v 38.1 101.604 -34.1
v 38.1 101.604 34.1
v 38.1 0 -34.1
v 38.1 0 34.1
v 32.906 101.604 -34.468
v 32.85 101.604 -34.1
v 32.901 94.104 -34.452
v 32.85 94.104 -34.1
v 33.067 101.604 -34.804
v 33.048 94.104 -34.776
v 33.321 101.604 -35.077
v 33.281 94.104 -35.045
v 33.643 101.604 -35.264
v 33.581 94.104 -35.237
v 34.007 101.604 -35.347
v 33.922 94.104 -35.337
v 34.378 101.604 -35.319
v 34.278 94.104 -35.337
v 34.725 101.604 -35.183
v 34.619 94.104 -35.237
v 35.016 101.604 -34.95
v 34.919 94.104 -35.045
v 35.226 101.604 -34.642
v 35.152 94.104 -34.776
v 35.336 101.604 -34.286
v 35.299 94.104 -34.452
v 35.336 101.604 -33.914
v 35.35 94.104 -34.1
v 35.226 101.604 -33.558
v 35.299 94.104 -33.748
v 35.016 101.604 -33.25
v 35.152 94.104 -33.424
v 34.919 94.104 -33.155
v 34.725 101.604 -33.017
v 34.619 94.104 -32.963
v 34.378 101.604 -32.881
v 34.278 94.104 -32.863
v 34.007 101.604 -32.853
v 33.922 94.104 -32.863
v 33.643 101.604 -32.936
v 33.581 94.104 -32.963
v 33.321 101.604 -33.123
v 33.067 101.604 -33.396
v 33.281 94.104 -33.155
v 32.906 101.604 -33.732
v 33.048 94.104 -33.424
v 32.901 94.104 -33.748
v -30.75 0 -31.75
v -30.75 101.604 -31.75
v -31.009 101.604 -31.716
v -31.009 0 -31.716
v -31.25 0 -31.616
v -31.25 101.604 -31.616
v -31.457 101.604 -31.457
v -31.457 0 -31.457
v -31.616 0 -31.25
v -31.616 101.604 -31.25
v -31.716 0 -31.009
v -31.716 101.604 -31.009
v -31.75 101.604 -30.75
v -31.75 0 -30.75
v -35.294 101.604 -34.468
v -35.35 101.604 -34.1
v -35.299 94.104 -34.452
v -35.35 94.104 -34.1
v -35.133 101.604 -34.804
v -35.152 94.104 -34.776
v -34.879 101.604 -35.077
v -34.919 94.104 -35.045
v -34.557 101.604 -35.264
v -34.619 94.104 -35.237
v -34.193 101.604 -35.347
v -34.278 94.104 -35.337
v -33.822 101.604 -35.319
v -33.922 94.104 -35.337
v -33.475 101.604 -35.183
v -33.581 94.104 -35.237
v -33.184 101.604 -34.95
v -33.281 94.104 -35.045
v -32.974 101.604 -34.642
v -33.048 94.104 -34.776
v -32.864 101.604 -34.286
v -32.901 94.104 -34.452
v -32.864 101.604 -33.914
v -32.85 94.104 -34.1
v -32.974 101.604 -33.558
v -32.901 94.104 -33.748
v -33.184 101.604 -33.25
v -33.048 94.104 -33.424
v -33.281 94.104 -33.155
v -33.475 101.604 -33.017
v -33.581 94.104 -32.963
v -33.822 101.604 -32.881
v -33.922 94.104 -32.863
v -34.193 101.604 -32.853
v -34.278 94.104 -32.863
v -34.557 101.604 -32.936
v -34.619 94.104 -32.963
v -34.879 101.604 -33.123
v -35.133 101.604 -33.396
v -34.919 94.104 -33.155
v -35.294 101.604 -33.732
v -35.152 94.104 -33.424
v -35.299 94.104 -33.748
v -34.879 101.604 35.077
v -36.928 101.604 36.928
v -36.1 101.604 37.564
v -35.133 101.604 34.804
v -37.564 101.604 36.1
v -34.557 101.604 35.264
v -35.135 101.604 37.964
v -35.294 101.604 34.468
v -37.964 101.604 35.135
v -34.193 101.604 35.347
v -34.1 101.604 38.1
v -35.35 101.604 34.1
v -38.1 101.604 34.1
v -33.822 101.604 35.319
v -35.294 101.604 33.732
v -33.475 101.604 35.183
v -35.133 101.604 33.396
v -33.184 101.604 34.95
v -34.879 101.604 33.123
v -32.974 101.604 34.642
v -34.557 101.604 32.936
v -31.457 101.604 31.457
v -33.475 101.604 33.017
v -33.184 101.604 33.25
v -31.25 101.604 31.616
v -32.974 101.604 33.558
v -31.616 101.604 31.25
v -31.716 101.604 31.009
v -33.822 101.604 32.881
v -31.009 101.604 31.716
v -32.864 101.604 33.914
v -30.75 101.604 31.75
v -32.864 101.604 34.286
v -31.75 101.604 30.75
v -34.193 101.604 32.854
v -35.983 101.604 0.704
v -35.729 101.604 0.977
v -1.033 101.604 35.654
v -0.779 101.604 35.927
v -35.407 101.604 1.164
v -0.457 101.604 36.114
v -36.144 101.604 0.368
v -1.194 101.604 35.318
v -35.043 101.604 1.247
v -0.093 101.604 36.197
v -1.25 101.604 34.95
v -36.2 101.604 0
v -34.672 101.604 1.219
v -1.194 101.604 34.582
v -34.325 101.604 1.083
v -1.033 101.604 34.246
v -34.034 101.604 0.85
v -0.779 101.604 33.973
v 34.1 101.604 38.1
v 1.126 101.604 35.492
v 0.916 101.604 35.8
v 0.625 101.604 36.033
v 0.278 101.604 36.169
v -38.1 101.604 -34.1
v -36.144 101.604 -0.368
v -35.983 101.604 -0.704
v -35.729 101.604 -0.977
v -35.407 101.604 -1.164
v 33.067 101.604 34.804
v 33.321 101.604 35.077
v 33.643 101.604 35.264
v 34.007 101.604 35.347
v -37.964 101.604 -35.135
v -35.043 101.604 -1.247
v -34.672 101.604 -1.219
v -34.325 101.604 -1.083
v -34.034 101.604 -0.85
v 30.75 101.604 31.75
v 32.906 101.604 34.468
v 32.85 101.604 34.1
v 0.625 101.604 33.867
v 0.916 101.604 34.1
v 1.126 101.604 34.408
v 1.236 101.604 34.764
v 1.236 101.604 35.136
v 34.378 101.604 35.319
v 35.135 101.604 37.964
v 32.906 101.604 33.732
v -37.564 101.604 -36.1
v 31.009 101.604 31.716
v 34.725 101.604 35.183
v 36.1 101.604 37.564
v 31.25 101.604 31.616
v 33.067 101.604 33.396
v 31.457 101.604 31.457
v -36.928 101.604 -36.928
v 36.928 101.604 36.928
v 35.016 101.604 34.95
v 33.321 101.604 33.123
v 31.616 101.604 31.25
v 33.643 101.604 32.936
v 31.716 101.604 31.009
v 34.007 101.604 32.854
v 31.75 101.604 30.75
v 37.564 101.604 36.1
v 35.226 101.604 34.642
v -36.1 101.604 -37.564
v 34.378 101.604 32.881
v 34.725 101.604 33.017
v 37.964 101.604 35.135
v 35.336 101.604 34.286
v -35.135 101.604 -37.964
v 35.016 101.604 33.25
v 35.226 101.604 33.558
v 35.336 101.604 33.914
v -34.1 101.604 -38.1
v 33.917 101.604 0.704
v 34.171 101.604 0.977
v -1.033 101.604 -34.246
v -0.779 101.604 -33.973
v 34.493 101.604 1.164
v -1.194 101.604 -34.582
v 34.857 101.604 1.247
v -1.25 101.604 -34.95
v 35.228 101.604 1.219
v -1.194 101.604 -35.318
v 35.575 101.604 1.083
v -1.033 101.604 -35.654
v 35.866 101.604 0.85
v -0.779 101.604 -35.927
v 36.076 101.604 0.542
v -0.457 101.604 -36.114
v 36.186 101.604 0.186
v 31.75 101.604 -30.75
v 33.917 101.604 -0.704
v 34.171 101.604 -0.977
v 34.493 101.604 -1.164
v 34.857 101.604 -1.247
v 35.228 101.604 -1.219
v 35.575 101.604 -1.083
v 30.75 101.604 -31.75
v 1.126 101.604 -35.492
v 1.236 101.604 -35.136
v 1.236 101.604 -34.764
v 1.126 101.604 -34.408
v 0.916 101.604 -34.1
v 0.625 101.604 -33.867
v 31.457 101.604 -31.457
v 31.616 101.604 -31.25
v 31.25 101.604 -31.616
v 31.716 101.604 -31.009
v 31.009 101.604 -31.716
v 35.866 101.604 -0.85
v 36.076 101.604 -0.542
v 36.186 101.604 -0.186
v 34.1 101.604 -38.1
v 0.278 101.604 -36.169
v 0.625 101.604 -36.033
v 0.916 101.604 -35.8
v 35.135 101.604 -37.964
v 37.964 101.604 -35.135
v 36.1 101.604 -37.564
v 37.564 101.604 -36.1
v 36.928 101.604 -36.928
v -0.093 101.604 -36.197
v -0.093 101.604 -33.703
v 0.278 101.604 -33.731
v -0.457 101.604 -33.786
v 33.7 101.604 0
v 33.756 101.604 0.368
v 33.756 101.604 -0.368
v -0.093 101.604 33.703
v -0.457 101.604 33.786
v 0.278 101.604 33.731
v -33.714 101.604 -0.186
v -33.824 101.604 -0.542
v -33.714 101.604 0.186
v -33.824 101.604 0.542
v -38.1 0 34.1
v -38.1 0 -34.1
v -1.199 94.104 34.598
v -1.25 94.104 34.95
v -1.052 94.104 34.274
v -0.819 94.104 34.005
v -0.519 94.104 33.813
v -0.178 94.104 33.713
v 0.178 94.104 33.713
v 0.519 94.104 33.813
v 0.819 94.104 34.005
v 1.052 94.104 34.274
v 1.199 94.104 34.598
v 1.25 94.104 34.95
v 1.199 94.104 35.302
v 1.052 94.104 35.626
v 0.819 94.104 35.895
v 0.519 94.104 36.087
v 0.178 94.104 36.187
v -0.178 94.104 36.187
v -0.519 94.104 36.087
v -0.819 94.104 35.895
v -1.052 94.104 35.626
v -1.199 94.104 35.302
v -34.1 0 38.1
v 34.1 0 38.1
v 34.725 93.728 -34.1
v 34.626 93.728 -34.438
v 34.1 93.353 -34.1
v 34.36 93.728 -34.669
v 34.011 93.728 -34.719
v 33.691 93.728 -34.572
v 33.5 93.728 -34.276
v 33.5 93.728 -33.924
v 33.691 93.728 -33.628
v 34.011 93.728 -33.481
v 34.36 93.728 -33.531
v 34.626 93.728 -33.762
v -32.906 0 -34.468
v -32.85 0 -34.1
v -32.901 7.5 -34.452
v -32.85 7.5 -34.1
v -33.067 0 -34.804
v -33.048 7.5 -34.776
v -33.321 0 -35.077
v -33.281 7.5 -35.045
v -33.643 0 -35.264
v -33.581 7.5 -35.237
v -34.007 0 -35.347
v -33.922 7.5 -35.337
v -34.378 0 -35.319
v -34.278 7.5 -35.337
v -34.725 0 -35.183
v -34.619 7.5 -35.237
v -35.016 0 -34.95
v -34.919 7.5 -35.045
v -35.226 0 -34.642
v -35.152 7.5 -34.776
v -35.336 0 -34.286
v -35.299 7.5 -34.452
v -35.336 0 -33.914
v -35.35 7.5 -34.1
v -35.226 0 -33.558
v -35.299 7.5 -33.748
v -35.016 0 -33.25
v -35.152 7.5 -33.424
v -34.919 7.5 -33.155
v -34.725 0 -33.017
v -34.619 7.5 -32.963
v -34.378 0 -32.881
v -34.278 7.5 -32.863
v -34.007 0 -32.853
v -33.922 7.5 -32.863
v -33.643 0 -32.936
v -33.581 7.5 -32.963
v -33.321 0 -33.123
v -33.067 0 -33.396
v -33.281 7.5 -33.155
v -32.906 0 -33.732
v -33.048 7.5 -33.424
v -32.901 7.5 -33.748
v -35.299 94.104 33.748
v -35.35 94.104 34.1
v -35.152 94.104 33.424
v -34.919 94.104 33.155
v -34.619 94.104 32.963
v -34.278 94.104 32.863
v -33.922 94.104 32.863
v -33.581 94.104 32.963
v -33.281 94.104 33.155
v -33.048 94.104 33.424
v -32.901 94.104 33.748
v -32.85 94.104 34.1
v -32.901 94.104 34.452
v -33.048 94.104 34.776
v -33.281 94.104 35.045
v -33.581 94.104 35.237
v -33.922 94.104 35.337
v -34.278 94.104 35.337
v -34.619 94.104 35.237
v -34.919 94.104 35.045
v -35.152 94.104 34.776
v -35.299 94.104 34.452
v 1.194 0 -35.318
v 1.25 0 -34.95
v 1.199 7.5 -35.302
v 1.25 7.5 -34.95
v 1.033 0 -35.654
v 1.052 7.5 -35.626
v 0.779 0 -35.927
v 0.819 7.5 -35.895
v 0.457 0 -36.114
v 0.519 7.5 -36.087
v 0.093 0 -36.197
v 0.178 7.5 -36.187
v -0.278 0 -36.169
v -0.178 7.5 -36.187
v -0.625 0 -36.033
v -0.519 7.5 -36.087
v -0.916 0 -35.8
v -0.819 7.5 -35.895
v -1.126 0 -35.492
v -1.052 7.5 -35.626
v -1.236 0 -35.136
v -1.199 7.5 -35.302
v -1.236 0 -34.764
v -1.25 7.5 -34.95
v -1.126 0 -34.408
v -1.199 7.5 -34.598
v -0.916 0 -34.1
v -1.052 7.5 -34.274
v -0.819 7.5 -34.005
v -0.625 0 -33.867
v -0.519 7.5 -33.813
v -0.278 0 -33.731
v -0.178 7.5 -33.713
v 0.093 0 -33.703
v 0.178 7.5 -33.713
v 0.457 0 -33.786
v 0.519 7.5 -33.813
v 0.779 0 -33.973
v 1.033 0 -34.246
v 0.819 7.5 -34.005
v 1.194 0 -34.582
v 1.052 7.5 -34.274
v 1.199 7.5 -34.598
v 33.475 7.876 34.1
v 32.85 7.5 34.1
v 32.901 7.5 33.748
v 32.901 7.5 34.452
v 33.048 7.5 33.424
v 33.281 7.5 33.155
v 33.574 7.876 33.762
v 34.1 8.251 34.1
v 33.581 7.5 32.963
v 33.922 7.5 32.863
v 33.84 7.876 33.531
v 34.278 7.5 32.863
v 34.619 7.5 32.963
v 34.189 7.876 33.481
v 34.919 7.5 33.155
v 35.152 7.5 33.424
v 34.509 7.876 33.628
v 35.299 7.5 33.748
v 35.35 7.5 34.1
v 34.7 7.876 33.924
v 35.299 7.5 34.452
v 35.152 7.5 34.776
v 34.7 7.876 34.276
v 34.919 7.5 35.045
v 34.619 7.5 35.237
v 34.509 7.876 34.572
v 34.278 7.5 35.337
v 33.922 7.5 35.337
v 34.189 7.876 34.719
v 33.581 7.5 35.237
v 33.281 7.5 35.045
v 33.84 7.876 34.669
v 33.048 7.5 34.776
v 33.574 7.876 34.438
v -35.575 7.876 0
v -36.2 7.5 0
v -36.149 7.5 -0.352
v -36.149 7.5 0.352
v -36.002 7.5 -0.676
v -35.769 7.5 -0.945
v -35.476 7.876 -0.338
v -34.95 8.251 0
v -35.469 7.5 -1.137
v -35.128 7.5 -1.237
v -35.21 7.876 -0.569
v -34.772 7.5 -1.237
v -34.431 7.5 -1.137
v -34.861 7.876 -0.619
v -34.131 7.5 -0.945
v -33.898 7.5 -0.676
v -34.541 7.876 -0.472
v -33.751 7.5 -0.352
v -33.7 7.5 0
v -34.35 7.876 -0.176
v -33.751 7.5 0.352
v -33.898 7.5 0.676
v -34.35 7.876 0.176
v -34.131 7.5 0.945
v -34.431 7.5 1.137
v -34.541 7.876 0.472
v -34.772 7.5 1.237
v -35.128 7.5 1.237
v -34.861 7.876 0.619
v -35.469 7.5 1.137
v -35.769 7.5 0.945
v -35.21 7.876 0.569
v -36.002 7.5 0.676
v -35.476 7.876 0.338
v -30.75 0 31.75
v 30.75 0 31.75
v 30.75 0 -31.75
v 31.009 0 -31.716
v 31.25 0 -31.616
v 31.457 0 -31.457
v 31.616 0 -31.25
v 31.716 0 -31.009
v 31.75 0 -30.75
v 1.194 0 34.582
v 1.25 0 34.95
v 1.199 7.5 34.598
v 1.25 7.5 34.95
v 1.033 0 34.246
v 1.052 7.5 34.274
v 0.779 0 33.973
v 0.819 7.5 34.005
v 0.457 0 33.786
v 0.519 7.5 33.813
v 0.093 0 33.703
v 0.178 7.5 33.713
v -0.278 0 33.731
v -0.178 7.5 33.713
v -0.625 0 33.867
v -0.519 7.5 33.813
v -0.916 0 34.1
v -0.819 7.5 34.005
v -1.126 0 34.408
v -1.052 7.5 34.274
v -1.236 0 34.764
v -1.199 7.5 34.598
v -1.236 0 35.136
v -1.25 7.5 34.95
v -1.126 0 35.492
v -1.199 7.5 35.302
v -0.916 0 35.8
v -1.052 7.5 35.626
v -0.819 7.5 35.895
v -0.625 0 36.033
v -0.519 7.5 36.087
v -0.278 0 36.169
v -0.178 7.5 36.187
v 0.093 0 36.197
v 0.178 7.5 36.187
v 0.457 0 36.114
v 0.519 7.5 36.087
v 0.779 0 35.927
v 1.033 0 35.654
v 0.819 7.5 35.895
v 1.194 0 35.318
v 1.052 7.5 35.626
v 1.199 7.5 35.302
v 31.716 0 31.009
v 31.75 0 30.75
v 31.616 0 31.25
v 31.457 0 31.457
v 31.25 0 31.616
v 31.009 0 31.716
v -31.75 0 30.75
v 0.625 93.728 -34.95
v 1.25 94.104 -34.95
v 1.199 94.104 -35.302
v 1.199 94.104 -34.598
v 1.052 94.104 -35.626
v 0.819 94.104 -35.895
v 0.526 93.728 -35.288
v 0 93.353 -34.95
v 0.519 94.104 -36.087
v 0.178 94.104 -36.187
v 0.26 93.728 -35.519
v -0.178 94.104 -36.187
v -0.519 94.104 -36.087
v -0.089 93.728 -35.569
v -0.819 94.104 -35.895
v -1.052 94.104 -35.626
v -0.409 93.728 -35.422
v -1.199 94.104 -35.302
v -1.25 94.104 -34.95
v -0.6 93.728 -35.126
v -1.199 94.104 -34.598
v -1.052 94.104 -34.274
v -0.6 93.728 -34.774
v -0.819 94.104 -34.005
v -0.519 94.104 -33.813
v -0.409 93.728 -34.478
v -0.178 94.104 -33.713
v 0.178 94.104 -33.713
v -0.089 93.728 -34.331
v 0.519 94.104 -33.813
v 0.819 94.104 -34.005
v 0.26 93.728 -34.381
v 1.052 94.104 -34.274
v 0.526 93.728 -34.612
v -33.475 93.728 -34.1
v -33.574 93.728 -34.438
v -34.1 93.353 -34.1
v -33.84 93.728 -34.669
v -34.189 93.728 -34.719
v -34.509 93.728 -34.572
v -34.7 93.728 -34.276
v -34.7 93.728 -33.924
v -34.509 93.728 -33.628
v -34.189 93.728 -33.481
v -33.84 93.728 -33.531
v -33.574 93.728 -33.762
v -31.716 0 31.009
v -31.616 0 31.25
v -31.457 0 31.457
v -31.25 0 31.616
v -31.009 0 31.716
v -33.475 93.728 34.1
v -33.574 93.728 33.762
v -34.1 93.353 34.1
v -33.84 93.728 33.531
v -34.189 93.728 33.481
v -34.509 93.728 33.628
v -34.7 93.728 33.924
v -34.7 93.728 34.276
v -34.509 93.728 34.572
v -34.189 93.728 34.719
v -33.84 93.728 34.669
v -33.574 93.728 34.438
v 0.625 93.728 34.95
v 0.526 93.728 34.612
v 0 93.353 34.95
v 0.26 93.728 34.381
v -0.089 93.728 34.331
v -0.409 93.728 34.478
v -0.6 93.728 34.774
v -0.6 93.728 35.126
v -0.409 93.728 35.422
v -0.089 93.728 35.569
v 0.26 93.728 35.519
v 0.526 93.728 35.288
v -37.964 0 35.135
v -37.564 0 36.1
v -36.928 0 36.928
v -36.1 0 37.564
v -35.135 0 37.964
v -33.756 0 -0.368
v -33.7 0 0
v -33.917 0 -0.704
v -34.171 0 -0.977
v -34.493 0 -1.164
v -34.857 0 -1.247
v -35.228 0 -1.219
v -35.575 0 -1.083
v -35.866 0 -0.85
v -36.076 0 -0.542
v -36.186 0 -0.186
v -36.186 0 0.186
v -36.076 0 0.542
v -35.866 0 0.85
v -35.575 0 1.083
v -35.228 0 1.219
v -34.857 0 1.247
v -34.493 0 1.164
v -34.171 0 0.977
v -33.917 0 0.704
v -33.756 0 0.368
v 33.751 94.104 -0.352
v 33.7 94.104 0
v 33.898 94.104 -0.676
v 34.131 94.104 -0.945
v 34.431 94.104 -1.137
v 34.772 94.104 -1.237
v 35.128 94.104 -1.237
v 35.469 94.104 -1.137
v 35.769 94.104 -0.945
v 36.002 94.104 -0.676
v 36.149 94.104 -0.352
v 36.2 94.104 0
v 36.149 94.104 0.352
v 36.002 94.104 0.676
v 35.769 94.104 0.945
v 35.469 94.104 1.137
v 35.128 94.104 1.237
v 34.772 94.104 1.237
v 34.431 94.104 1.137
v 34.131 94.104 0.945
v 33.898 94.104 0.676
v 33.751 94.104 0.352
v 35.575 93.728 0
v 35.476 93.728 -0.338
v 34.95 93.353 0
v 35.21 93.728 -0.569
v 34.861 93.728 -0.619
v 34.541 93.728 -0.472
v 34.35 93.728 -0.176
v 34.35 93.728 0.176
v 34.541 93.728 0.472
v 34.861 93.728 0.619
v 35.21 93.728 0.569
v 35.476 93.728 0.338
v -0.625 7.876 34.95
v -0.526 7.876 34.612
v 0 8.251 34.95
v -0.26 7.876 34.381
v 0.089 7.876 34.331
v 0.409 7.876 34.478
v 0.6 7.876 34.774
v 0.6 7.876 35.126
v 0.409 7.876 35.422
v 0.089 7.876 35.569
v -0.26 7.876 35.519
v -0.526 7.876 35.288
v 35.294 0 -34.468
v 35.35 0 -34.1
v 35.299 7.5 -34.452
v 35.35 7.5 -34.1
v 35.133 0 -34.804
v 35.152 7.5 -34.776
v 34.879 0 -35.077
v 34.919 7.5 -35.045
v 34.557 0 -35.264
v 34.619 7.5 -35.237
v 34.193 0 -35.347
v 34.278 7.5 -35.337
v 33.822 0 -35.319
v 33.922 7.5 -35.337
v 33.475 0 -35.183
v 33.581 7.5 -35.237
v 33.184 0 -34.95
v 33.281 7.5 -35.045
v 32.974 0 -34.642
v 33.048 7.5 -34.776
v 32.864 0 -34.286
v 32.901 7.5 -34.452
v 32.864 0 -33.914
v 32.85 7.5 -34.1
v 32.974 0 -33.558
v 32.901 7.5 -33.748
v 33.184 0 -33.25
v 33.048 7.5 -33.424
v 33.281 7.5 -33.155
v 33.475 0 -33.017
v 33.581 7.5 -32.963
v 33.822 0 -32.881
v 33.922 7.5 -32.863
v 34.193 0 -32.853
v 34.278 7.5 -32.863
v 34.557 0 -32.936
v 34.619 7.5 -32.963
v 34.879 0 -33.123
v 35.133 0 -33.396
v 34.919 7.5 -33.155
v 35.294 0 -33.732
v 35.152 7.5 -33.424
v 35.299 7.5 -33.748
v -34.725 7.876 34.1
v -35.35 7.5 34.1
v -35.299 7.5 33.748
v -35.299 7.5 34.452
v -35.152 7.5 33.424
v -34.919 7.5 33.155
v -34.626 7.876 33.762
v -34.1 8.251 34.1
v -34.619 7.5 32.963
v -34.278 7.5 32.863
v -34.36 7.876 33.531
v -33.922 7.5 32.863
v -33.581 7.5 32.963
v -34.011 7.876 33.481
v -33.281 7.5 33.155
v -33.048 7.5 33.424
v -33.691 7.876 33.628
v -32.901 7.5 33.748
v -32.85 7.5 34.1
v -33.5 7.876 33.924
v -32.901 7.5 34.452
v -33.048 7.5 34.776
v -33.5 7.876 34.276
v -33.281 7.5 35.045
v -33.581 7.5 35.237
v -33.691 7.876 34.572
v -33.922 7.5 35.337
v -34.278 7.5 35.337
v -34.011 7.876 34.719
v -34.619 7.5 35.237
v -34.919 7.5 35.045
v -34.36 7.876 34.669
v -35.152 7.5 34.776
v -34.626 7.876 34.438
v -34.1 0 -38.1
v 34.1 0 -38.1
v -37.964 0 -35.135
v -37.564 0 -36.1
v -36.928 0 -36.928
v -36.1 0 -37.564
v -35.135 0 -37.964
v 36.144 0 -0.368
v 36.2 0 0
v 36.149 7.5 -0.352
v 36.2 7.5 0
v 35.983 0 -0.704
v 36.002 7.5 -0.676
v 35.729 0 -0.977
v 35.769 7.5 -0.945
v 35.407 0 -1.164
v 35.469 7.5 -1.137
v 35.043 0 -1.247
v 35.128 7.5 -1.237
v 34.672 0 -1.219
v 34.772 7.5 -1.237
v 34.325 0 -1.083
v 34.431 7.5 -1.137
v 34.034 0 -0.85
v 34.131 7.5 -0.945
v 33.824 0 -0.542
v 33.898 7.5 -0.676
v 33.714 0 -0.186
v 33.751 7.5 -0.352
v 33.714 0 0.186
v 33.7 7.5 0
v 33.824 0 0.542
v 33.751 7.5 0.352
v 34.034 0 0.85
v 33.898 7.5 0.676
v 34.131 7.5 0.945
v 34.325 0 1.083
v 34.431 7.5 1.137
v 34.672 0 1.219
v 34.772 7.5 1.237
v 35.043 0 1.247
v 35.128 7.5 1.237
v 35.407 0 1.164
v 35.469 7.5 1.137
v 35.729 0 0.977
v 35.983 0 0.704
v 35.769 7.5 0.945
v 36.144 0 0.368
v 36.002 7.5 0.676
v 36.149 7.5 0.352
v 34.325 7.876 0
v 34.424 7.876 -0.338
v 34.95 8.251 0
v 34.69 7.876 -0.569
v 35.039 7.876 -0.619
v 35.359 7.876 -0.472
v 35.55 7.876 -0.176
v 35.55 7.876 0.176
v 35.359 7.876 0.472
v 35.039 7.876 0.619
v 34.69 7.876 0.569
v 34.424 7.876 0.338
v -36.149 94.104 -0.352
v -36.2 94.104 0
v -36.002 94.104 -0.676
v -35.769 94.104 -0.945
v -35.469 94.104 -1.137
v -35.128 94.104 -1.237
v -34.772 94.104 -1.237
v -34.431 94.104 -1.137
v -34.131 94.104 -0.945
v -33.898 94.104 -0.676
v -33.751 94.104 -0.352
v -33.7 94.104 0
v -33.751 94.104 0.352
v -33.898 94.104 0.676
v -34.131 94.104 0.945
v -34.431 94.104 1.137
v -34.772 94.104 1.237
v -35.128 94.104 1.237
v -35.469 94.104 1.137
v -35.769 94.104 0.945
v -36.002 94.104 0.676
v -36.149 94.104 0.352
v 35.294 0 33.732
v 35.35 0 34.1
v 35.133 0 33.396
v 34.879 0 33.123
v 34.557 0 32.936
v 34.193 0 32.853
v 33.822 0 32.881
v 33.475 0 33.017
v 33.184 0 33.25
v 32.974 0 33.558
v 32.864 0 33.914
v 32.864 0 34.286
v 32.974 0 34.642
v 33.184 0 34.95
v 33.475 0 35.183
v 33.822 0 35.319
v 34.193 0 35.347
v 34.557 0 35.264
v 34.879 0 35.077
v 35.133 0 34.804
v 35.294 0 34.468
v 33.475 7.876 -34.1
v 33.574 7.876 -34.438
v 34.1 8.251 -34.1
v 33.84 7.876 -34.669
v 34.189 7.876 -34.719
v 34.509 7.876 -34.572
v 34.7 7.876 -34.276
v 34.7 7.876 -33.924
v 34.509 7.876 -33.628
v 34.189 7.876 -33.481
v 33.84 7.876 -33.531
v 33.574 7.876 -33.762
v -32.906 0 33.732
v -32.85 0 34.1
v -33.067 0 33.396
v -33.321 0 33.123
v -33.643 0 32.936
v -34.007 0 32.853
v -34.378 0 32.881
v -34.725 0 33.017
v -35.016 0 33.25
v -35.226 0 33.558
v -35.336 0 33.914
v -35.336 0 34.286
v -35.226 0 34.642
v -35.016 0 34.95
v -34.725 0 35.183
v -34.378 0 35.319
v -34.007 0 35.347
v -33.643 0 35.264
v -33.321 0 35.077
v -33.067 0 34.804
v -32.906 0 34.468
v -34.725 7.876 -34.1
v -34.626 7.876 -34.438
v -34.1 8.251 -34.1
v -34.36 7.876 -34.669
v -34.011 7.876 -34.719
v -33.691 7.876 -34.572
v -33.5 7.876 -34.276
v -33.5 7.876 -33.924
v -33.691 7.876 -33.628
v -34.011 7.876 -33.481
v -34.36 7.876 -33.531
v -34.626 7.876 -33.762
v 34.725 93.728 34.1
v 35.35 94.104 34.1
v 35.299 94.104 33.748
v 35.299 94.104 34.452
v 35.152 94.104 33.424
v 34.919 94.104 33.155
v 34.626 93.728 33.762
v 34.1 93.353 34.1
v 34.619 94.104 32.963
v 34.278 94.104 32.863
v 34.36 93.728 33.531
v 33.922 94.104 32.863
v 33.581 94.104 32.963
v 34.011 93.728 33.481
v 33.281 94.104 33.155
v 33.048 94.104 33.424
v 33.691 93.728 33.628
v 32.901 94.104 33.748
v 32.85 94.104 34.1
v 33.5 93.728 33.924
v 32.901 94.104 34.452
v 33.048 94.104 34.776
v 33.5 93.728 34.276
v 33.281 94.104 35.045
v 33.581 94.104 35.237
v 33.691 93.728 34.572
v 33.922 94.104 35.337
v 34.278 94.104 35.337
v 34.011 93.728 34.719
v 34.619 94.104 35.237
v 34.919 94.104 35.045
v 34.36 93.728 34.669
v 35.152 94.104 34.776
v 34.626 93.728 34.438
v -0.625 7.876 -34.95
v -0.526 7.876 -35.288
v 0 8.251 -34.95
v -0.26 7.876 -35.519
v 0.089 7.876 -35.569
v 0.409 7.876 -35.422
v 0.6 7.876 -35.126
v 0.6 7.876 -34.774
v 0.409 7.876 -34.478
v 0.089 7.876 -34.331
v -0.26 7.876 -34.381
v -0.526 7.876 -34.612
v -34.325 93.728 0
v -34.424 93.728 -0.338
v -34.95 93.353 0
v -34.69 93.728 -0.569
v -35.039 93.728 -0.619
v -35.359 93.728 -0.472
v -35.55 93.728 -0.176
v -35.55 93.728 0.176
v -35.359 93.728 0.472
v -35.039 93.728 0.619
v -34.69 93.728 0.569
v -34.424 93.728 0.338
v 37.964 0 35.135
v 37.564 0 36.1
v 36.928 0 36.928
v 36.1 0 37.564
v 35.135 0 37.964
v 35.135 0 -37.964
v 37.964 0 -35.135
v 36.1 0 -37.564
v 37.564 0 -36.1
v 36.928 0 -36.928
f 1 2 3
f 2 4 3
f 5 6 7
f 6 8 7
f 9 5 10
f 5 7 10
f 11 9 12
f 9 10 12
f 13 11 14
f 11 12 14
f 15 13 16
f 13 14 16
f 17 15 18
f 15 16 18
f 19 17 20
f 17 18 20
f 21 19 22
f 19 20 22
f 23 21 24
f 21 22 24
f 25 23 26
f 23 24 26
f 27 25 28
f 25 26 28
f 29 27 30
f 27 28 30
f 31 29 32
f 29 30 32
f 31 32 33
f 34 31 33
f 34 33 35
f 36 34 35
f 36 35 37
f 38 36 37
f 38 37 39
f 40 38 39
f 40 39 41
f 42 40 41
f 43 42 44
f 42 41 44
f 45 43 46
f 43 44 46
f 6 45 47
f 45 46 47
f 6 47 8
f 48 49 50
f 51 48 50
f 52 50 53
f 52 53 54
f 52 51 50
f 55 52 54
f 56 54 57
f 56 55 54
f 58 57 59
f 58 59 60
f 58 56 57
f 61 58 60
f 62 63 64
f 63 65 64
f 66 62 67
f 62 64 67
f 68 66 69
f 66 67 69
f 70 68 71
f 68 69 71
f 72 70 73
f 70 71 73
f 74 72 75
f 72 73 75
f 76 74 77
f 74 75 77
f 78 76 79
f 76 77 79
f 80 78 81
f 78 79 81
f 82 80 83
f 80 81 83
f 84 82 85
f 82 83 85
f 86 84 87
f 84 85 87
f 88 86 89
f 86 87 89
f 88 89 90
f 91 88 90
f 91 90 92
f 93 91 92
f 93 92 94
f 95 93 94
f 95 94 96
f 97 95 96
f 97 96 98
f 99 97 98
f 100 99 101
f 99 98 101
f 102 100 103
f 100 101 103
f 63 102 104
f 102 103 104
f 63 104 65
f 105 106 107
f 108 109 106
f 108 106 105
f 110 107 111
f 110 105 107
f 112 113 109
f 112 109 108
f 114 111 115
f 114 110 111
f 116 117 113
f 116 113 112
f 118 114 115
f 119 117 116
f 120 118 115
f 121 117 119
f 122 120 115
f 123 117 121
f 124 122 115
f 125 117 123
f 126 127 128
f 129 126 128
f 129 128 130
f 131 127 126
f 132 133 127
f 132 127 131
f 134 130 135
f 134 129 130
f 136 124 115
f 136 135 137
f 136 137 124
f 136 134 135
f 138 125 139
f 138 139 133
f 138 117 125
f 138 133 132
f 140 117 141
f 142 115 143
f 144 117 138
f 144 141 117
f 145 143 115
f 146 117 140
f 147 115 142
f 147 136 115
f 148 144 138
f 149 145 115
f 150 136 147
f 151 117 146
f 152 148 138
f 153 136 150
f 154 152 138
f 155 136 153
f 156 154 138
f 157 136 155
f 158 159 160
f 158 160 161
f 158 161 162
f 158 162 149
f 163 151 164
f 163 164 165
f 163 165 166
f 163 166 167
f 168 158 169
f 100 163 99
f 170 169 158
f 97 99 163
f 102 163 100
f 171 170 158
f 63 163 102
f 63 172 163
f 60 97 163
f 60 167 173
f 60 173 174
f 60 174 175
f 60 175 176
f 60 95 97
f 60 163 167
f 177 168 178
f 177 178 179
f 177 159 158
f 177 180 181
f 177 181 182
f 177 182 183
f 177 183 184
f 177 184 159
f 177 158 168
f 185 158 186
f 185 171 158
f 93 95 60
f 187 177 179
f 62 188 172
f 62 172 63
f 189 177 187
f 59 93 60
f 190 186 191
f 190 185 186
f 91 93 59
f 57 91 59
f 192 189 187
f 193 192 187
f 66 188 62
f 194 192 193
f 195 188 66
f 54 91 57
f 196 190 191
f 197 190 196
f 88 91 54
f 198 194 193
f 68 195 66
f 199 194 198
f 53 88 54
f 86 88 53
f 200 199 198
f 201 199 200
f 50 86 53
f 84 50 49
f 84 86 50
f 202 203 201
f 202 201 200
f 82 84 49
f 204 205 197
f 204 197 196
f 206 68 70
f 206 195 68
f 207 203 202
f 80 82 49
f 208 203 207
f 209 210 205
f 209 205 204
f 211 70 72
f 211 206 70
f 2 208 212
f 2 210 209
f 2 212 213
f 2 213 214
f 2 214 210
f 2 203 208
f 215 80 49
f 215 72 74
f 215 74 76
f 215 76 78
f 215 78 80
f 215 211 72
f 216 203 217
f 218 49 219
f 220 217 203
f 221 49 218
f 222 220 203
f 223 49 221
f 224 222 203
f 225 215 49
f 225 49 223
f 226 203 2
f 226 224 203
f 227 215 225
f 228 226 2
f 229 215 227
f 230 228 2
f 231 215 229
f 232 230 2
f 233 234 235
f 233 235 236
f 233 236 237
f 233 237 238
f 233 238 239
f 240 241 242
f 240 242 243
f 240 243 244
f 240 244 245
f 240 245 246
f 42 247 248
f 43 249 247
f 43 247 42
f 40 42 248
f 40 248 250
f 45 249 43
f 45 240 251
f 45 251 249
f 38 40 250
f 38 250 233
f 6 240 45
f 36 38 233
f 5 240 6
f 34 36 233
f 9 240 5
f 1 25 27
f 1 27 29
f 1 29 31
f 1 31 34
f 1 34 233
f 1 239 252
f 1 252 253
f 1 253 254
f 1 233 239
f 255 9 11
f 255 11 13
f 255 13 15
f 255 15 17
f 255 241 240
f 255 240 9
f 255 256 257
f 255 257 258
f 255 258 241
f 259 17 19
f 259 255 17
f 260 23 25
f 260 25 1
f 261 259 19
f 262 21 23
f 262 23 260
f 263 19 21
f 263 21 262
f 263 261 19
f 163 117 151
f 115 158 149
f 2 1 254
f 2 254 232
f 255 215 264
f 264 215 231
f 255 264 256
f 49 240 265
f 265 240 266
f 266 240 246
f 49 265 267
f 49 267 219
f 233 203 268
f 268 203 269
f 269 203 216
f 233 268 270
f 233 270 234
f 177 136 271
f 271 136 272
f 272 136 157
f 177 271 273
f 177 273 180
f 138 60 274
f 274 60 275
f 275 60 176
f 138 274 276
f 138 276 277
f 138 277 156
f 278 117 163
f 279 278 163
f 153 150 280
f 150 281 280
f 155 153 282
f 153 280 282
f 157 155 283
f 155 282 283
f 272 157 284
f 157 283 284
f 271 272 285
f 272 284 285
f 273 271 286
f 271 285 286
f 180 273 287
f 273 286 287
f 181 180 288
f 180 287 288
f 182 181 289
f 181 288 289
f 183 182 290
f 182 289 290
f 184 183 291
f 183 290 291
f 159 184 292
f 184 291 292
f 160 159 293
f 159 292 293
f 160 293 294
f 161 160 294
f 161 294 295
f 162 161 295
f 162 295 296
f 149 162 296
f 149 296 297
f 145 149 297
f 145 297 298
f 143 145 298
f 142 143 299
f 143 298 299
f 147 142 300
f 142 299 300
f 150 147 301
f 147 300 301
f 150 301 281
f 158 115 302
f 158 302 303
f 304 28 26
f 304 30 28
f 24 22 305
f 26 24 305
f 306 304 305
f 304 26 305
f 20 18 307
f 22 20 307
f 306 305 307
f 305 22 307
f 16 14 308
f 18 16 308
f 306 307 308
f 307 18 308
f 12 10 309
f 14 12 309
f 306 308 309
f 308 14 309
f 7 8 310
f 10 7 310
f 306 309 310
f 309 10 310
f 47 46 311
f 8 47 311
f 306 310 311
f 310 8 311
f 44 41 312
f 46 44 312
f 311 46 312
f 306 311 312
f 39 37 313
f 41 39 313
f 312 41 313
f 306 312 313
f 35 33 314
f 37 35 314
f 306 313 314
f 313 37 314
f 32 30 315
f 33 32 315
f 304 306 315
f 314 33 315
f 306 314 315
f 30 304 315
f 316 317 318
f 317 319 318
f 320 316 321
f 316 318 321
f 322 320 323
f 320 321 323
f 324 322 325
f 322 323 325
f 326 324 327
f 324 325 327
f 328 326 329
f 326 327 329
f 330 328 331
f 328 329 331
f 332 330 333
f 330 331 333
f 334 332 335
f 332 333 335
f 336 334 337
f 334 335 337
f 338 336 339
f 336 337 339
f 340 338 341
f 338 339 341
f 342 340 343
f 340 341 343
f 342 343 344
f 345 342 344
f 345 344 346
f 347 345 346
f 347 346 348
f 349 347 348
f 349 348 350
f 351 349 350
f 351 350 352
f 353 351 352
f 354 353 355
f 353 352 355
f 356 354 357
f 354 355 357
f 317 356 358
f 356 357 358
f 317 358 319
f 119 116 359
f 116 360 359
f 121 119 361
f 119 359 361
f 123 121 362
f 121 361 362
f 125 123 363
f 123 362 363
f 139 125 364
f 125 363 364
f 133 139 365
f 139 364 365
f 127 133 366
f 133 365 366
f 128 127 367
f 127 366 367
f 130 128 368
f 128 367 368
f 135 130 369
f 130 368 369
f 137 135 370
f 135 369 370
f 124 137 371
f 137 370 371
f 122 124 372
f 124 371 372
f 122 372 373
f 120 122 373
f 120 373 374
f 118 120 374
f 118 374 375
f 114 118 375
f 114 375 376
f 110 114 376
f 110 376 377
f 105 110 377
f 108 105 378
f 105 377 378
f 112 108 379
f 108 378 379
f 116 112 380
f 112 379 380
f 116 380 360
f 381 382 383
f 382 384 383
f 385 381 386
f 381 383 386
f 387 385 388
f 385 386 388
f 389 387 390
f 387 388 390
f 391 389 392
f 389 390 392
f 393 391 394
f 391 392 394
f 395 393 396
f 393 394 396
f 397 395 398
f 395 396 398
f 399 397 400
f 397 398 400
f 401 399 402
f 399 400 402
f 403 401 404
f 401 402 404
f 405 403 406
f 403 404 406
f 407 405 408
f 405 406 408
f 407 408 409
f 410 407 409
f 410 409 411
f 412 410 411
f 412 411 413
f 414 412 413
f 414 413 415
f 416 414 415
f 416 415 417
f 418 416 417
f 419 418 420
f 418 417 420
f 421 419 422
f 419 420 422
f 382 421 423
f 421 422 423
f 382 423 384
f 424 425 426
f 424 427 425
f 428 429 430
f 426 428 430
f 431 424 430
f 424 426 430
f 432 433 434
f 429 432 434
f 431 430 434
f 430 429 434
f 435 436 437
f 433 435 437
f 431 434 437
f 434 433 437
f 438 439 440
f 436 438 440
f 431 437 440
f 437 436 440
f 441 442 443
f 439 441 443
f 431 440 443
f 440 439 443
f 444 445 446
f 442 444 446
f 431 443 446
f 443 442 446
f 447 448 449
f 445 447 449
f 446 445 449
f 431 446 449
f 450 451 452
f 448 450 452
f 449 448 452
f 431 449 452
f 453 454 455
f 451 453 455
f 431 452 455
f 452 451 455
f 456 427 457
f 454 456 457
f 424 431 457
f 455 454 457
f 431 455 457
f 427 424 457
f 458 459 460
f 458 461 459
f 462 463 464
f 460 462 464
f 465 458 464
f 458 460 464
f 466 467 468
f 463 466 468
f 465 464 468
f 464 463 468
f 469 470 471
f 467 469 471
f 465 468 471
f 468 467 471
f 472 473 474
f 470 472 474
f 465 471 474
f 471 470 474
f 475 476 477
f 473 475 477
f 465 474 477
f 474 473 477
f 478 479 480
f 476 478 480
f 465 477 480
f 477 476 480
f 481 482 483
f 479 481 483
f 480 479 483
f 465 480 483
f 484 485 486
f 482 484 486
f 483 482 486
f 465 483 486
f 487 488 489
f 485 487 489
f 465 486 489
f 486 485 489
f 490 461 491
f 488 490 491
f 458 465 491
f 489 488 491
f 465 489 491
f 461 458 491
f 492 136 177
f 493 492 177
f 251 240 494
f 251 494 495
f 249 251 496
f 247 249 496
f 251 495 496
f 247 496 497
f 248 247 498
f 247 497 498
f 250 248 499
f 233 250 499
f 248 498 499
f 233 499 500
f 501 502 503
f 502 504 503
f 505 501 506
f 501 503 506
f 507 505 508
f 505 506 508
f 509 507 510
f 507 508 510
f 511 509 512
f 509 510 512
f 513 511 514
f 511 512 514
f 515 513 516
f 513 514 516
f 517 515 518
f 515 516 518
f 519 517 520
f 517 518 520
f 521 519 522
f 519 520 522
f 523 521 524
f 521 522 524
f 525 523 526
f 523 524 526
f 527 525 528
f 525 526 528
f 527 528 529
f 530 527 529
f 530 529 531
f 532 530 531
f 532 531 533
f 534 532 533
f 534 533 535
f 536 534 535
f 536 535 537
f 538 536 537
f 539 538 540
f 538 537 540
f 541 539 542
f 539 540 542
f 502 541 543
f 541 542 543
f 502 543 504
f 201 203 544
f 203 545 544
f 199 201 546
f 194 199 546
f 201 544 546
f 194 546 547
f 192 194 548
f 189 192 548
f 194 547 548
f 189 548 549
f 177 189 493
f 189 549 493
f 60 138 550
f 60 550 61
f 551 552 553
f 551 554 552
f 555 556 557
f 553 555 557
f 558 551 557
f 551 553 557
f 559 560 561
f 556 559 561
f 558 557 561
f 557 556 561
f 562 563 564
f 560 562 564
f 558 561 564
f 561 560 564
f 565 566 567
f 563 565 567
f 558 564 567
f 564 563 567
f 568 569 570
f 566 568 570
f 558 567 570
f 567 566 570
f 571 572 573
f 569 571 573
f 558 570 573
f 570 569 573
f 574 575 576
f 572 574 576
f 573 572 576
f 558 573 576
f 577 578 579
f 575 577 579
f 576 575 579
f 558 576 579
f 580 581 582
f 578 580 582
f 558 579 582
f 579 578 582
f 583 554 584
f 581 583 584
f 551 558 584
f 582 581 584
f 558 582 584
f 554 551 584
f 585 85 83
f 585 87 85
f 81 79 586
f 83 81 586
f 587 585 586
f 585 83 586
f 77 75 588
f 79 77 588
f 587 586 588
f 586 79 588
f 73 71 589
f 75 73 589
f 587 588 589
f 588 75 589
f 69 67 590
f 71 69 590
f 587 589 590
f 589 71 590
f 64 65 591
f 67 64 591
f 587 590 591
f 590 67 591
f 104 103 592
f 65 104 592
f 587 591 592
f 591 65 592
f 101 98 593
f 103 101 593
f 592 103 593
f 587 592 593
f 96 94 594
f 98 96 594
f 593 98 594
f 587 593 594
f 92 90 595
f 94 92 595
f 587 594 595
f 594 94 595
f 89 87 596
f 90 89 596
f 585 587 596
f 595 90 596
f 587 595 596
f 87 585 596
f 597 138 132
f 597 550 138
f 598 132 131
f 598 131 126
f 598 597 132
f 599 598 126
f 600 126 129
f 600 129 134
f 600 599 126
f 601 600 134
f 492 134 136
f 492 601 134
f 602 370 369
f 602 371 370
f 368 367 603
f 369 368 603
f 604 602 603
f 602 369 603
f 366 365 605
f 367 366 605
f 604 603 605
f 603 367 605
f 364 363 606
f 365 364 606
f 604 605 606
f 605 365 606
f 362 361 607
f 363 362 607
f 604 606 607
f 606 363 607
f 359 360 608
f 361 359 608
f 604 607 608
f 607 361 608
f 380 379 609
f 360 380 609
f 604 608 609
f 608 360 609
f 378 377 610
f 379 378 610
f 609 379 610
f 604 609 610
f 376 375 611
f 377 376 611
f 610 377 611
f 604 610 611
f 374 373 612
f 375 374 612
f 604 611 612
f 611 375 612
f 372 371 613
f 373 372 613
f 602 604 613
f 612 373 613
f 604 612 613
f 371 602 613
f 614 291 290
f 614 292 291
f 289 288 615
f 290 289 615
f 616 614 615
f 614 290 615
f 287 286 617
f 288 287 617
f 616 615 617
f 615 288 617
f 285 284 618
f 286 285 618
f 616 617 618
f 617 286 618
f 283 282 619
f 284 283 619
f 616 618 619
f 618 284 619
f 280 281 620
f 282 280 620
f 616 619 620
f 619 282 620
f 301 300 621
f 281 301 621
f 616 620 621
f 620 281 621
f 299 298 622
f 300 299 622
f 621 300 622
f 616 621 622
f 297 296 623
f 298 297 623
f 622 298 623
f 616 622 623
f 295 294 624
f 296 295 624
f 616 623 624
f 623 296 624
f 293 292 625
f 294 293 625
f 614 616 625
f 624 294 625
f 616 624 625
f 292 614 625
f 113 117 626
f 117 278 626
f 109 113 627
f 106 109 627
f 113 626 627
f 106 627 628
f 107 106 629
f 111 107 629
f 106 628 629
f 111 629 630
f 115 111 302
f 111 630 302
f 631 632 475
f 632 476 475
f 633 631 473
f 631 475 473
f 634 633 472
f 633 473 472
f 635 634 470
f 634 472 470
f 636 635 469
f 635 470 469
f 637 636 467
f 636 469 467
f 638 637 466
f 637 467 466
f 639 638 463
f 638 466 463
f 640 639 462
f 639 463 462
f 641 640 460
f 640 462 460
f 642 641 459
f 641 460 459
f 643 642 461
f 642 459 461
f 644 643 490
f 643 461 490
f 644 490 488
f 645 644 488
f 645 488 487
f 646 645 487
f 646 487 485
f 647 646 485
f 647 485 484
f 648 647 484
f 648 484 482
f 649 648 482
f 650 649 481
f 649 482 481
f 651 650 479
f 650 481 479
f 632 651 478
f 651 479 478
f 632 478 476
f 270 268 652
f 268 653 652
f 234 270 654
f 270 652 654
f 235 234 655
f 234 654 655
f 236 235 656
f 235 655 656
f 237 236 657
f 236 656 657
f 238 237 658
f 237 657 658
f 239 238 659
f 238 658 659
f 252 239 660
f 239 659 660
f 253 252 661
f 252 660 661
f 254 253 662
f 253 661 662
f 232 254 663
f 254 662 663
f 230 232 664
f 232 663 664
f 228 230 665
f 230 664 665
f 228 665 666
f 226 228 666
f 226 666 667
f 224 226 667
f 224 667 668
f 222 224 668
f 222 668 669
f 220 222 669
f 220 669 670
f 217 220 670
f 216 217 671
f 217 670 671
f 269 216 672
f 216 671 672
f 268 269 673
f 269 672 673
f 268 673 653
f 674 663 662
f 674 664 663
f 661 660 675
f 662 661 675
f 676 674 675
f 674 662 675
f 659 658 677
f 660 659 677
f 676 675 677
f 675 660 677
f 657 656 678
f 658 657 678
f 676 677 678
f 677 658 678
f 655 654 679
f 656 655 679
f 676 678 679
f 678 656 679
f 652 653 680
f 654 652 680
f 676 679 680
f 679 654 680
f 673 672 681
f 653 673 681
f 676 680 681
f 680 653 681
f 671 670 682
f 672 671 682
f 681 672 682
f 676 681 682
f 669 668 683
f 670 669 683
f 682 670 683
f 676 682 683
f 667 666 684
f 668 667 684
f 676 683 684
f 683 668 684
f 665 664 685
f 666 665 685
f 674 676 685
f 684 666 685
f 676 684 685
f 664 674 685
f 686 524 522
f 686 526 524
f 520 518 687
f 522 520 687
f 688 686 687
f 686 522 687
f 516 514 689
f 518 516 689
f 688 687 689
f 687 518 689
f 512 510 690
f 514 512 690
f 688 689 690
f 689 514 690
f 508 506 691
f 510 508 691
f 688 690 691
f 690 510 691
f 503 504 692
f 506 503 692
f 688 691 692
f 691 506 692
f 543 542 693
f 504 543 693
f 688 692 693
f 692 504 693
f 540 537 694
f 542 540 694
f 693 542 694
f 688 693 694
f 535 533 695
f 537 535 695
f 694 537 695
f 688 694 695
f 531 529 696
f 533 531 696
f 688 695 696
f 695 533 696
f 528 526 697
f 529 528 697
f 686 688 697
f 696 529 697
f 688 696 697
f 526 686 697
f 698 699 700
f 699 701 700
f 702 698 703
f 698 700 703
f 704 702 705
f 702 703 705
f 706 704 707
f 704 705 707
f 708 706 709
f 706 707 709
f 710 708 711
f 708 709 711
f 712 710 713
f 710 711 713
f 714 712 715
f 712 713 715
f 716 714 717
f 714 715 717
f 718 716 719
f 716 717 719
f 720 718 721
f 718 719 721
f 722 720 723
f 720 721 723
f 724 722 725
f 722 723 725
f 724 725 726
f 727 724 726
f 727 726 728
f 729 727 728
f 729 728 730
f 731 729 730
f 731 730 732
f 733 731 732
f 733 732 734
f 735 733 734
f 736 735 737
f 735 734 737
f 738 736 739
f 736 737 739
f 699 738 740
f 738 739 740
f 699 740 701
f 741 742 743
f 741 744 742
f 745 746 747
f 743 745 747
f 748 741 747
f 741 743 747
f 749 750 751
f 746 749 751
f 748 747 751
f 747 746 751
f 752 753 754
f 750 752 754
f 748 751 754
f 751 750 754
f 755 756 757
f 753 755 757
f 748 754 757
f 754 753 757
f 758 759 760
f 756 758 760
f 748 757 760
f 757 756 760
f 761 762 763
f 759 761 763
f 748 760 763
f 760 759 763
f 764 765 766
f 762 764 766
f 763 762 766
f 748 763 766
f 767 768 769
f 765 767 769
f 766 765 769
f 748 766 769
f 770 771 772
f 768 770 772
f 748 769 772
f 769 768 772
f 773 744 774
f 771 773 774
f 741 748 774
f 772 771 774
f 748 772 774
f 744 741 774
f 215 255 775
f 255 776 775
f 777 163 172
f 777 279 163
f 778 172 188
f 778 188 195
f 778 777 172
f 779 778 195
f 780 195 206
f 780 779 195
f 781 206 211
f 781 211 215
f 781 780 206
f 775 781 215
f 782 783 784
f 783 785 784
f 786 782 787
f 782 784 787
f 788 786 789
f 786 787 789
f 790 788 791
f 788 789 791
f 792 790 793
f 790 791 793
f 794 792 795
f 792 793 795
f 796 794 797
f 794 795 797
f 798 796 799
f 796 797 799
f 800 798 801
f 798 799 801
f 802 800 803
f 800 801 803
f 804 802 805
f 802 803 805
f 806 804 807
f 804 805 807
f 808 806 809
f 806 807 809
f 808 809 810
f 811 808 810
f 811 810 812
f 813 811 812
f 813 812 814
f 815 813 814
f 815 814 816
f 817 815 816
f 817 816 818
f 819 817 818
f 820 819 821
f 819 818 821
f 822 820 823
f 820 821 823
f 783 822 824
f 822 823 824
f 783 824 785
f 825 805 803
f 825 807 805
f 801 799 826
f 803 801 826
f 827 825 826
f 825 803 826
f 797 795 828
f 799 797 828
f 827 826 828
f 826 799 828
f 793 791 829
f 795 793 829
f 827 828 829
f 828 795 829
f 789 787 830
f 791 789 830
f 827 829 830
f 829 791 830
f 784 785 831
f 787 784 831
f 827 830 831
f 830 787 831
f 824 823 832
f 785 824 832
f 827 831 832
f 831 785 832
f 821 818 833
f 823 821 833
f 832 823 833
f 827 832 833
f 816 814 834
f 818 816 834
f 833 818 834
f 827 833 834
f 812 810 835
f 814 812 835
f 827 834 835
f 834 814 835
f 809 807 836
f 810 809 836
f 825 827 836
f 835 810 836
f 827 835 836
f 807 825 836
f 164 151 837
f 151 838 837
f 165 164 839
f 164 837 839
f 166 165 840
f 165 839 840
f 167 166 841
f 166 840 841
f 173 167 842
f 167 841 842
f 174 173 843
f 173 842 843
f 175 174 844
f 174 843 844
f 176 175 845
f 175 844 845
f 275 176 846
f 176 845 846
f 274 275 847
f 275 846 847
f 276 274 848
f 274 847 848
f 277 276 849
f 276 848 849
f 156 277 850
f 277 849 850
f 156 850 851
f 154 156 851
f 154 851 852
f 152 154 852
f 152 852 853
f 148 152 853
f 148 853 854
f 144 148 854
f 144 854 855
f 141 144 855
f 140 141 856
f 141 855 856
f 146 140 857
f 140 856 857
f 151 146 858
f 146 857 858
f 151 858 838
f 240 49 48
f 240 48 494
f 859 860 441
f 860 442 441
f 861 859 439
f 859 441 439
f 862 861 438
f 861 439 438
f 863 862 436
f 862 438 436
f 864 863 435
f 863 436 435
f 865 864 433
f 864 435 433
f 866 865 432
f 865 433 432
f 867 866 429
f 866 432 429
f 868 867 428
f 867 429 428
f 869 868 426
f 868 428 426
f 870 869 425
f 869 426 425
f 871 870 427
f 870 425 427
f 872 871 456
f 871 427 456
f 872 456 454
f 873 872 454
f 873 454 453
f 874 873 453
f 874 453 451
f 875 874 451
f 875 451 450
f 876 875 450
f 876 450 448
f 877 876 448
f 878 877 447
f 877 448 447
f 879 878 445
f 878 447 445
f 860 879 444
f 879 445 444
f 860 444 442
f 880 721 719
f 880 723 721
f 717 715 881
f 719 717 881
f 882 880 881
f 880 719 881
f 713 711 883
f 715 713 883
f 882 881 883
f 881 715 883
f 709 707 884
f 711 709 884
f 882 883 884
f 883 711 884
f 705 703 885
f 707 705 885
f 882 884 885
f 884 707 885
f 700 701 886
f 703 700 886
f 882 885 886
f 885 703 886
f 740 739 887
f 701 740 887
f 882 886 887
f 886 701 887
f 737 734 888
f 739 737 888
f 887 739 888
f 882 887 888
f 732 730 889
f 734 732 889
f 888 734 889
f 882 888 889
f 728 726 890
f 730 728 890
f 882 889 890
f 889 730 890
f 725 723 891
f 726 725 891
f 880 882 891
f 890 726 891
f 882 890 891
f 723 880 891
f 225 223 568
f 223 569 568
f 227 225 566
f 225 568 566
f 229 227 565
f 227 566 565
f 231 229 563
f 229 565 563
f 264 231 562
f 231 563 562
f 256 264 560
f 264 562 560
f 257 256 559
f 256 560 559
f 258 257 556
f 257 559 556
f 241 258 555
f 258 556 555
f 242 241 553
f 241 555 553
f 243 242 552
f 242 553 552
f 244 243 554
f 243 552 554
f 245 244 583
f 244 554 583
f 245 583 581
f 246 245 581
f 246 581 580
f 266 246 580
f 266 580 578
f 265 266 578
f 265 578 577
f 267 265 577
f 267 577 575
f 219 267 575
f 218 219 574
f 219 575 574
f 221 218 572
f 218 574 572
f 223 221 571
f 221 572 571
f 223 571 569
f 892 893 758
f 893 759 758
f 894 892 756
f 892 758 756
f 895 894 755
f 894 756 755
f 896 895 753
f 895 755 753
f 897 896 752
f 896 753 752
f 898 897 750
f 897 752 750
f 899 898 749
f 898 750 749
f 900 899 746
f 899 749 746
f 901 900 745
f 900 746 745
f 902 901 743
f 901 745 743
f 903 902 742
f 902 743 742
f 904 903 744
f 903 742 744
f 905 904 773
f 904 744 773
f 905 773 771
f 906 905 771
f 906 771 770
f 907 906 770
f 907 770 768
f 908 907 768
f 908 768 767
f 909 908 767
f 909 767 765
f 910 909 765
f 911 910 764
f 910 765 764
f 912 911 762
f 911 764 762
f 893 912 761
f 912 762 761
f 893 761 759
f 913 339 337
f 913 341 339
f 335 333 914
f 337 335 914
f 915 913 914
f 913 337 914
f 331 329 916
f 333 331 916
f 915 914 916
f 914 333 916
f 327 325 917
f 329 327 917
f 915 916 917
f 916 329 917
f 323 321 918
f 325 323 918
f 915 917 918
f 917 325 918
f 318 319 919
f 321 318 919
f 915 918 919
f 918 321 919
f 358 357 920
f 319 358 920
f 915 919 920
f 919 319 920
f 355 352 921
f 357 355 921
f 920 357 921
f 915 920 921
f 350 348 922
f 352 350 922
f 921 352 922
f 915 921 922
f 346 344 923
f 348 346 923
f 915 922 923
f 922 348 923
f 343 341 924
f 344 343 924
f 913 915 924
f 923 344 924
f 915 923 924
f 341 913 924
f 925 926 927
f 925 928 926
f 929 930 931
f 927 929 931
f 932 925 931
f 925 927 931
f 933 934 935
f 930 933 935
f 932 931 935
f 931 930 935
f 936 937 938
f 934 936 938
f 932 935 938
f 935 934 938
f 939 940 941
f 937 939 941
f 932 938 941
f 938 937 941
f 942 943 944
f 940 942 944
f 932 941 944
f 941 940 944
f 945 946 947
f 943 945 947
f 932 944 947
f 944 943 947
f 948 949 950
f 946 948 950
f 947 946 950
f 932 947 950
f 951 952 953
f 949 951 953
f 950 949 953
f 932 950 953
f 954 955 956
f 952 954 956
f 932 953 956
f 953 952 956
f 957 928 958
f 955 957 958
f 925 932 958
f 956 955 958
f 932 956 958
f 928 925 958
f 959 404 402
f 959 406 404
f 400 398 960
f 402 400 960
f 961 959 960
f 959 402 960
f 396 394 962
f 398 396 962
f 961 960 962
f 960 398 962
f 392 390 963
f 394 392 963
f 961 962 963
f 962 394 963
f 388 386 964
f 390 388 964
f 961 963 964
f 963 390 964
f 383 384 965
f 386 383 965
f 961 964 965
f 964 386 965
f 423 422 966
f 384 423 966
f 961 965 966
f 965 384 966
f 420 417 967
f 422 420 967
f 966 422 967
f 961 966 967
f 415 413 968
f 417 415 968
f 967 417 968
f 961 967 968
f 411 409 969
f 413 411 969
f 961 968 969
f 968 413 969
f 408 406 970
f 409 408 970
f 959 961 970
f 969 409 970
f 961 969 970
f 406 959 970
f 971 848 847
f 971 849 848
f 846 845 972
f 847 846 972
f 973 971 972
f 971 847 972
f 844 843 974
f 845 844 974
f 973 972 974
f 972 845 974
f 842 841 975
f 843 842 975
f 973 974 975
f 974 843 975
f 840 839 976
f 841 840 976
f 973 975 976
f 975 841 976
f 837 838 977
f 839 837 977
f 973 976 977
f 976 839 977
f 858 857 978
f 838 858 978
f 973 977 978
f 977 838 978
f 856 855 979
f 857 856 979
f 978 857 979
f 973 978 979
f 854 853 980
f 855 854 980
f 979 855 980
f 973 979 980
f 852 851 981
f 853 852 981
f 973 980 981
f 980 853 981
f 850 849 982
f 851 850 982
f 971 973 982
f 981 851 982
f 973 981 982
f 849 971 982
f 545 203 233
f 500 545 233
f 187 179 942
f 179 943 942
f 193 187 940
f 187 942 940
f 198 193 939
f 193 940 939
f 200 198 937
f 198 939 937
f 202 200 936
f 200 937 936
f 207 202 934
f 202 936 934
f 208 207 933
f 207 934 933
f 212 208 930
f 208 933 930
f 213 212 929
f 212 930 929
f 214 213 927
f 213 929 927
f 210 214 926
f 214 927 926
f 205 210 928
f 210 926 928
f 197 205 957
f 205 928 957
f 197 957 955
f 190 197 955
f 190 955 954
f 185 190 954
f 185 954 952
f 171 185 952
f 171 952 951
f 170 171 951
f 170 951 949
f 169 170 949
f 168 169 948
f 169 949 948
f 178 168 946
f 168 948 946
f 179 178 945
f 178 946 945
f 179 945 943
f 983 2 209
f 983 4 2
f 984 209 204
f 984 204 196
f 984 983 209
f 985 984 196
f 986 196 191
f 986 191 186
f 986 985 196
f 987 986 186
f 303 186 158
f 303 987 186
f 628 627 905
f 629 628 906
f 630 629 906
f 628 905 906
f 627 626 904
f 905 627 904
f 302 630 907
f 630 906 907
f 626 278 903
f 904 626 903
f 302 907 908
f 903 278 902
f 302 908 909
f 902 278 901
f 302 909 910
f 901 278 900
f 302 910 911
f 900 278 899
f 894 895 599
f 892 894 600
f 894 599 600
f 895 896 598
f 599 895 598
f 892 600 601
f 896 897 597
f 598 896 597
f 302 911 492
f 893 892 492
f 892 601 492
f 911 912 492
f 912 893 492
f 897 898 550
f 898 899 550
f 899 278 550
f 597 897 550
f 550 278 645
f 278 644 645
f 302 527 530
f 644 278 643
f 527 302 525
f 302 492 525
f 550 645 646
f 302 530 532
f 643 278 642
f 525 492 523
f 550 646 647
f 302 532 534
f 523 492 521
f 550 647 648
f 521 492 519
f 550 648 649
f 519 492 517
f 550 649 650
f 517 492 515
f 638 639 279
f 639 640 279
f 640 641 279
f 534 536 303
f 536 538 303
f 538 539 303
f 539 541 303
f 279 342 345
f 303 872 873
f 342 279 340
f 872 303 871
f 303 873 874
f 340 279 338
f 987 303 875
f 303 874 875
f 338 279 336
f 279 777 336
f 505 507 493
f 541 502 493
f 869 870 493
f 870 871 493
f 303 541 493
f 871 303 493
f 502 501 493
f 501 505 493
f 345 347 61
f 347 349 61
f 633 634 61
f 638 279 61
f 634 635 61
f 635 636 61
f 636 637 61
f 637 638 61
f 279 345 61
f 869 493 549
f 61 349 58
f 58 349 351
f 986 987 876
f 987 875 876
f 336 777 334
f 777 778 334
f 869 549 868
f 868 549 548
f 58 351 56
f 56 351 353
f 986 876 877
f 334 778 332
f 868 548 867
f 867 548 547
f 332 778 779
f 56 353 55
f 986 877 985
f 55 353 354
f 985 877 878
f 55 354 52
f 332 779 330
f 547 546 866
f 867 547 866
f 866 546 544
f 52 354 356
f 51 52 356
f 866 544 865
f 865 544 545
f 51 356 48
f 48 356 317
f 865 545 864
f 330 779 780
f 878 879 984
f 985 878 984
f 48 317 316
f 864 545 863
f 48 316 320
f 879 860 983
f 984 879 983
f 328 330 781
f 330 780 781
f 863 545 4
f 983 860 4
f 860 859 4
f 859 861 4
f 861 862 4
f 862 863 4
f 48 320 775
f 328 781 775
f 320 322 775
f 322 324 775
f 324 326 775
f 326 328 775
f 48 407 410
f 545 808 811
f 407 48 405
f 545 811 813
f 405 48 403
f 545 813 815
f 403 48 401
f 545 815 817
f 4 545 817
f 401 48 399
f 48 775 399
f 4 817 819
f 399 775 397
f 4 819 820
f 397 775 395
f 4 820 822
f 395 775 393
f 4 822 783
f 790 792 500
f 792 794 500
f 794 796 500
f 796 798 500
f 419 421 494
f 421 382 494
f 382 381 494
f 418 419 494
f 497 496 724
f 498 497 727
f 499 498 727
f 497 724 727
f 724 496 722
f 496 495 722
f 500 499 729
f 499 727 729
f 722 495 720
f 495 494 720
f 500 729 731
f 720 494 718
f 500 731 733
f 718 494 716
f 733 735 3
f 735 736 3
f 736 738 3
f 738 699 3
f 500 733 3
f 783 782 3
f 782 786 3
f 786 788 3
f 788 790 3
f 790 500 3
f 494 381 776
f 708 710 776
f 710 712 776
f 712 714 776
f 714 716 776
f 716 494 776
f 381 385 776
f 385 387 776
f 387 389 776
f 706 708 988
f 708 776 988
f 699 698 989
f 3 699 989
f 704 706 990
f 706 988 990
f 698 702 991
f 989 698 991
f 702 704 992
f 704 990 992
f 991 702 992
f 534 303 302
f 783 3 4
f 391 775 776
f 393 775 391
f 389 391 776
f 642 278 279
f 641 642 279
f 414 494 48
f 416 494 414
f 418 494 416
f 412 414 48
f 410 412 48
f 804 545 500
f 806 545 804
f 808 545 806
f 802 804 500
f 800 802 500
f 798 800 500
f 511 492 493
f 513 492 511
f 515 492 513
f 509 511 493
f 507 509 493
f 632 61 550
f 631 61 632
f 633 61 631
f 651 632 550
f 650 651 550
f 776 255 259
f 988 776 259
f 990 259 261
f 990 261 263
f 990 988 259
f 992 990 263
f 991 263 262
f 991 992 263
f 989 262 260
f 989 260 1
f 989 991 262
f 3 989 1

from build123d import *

# Parameters (mm, degrees)
BOSS_EXTRUDE1_DEPTH       = 101.603999992
CUT_EXTRUDE1_DEPTH        = 246.126
SKETCH14_W                = 76.2
SKETCH14_H                = 76.2
SKETCH14_W_2              = 63.5
SKETCH14_H_2              = 63.5
BOSS_EXTRUDE3_DEPTH       = 101.603999992
FILLET1_R                 = 4
M3X0_5_TAPPED_HOLE2_D     = 2.5
M3X0_5_TAPPED_HOLE2_DEPTH = 7.5
M3X0_5_TAPPED_HOLE2_TIP   = 0.751075774
M3X0_5_TAPPED_HOLE1_D     = 2.5
M3X0_5_TAPPED_HOLE1_DEPTH = 7.5
M3X0_5_TAPPED_HOLE1_TIP   = 0.751075774
FILLET2_R                 = 1


with BuildPart() as part:
    # Sketch1 → Boss-Extrude1 (new body)
    with BuildSketch(Plane(origin=(0, 0, 0), x_dir=(1, 0, 0), z_dir=(0, 1, 0))):
        with BuildLine():
            Line((-35.56, -38.1), (35.56, -38.1))
            ThreePointArc((35.56, -38.1), (37.356051224, -37.356051224), (38.1, -35.56))
            Line((38.1, -35.56), (38.1, 35.56))
            ThreePointArc((38.1, 35.56), (37.356051224, 37.356051224), (35.56, 38.1))
            Line((35.56, 38.1), (-35.56, 38.1))
            ThreePointArc((-35.56, 38.1), (-37.356051224, 37.356051224), (-38.1, 35.56))
            Line((-38.1, 35.56), (-38.1, -35.56))
            ThreePointArc((-38.1, -35.56), (-37.356051224, -37.356051224), (-35.56, -38.1))
        make_face()
    extrude(amount=BOSS_EXTRUDE1_DEPTH)

    # Sketch9 → Cut-Extrude1 (cut)
    with BuildSketch(Plane(origin=(0, 101.603999992, 0), x_dir=(1, 0, 0), z_dir=(0, 1, 0))):
        with BuildLine():
            Line((-30.56, -33.1), (30.56, -33.1))
            ThreePointArc((30.56, -33.1), (32.356051224, -32.356051224), (33.1, -30.56))
            Line((33.1, -30.56), (33.1, 30.56))
            ThreePointArc((33.1, 30.56), (32.356051224, 32.356051224), (30.56, 33.1))
            Line((30.56, 33.1), (-30.56, 33.1))
            ThreePointArc((-30.56, 33.1), (-32.356051224, 32.356051224), (-33.1, 30.56))
            Line((-33.1, 30.56), (-33.1, -30.56))
            ThreePointArc((-33.1, -30.56), (-32.356051224, -32.356051224), (-30.56, -33.1))
        make_face()
    extrude(amount=-CUT_EXTRUDE1_DEPTH, mode=Mode.SUBTRACT)

    # Sketch14 → Boss-Extrude3 (add)
    with BuildSketch(Plane(origin=(0, 101.603999992, 0), x_dir=(1, 0, 0), z_dir=(0, 1, 0))):
        Rectangle(SKETCH14_W, SKETCH14_H)
        Rectangle(SKETCH14_W_2, SKETCH14_H_2, mode=Mode.SUBTRACT)
    extrude(amount=-BOSS_EXTRUDE3_DEPTH)

    # Fillet1
    fillet1_edges = [part.edges().sort_by_distance(p)[0] for p in [
        (38.1, 50.801999996, -38.1),
        (38.1, 50.801999996, 38.1),
        (-38.1, 50.801999996, 38.1),
        (-38.1, 50.801999996, -38.1),
    ]]
    fillet(fillet1_edges, radius=FILLET1_R)

    # M3x0.5 Tapped Hole2
    with Locations(Plane(origin=(0, 101.603999992, 0), x_dir=(1, 0, 0), z_dir=(0, 1, 0))):
        with Locations((-34.1, 34.1), (34.1, 34.1), (34.1, -34.100008), (-34.1, -34.100008), (-34.95, 0), (34.94999995, 0), (0, -34.95), (0, 34.95)):
            Hole(M3X0_5_TAPPED_HOLE2_D / 2, depth=M3X0_5_TAPPED_HOLE2_DEPTH)
            with Locations((0, 0, -(M3X0_5_TAPPED_HOLE2_DEPTH + M3X0_5_TAPPED_HOLE2_TIP / 2))):  # 118° drill point
                Cone(0, M3X0_5_TAPPED_HOLE2_D / 2, M3X0_5_TAPPED_HOLE2_TIP, mode=Mode.SUBTRACT)

    # M3x0.5 Tapped Hole1
    with Locations(Plane(origin=(0, 0, 0), x_dir=(-1, 0, 0), z_dir=(0, -1, 0))):
        with Locations((-34.100008, 34.1), (34.1, 34.1), (34.1, -34.1), (-34.100008, -34.1), (-34.95, 0), (0, 34.95), (34.95, 0), (0, -34.94999995)):
            Hole(M3X0_5_TAPPED_HOLE1_D / 2, depth=M3X0_5_TAPPED_HOLE1_DEPTH)
            with Locations((0, 0, -(M3X0_5_TAPPED_HOLE1_DEPTH + M3X0_5_TAPPED_HOLE1_TIP / 2))):  # 118° drill point
                Cone(0, M3X0_5_TAPPED_HOLE1_D / 2, M3X0_5_TAPPED_HOLE1_TIP, mode=Mode.SUBTRACT)

    # Fillet2
    fillet2_edges = [part.edges().sort_by_distance(p)[0] for p in [
        (31.75, 50.801999996, 31.75),
        (-31.75, 50.801999996, 31.75),
        (-31.75, 50.801999996, -31.75),
        (31.75, 50.801999996, -31.75),
    ]]
    fillet(fillet2_edges, radius=FILLET2_R)


solid = part.part
